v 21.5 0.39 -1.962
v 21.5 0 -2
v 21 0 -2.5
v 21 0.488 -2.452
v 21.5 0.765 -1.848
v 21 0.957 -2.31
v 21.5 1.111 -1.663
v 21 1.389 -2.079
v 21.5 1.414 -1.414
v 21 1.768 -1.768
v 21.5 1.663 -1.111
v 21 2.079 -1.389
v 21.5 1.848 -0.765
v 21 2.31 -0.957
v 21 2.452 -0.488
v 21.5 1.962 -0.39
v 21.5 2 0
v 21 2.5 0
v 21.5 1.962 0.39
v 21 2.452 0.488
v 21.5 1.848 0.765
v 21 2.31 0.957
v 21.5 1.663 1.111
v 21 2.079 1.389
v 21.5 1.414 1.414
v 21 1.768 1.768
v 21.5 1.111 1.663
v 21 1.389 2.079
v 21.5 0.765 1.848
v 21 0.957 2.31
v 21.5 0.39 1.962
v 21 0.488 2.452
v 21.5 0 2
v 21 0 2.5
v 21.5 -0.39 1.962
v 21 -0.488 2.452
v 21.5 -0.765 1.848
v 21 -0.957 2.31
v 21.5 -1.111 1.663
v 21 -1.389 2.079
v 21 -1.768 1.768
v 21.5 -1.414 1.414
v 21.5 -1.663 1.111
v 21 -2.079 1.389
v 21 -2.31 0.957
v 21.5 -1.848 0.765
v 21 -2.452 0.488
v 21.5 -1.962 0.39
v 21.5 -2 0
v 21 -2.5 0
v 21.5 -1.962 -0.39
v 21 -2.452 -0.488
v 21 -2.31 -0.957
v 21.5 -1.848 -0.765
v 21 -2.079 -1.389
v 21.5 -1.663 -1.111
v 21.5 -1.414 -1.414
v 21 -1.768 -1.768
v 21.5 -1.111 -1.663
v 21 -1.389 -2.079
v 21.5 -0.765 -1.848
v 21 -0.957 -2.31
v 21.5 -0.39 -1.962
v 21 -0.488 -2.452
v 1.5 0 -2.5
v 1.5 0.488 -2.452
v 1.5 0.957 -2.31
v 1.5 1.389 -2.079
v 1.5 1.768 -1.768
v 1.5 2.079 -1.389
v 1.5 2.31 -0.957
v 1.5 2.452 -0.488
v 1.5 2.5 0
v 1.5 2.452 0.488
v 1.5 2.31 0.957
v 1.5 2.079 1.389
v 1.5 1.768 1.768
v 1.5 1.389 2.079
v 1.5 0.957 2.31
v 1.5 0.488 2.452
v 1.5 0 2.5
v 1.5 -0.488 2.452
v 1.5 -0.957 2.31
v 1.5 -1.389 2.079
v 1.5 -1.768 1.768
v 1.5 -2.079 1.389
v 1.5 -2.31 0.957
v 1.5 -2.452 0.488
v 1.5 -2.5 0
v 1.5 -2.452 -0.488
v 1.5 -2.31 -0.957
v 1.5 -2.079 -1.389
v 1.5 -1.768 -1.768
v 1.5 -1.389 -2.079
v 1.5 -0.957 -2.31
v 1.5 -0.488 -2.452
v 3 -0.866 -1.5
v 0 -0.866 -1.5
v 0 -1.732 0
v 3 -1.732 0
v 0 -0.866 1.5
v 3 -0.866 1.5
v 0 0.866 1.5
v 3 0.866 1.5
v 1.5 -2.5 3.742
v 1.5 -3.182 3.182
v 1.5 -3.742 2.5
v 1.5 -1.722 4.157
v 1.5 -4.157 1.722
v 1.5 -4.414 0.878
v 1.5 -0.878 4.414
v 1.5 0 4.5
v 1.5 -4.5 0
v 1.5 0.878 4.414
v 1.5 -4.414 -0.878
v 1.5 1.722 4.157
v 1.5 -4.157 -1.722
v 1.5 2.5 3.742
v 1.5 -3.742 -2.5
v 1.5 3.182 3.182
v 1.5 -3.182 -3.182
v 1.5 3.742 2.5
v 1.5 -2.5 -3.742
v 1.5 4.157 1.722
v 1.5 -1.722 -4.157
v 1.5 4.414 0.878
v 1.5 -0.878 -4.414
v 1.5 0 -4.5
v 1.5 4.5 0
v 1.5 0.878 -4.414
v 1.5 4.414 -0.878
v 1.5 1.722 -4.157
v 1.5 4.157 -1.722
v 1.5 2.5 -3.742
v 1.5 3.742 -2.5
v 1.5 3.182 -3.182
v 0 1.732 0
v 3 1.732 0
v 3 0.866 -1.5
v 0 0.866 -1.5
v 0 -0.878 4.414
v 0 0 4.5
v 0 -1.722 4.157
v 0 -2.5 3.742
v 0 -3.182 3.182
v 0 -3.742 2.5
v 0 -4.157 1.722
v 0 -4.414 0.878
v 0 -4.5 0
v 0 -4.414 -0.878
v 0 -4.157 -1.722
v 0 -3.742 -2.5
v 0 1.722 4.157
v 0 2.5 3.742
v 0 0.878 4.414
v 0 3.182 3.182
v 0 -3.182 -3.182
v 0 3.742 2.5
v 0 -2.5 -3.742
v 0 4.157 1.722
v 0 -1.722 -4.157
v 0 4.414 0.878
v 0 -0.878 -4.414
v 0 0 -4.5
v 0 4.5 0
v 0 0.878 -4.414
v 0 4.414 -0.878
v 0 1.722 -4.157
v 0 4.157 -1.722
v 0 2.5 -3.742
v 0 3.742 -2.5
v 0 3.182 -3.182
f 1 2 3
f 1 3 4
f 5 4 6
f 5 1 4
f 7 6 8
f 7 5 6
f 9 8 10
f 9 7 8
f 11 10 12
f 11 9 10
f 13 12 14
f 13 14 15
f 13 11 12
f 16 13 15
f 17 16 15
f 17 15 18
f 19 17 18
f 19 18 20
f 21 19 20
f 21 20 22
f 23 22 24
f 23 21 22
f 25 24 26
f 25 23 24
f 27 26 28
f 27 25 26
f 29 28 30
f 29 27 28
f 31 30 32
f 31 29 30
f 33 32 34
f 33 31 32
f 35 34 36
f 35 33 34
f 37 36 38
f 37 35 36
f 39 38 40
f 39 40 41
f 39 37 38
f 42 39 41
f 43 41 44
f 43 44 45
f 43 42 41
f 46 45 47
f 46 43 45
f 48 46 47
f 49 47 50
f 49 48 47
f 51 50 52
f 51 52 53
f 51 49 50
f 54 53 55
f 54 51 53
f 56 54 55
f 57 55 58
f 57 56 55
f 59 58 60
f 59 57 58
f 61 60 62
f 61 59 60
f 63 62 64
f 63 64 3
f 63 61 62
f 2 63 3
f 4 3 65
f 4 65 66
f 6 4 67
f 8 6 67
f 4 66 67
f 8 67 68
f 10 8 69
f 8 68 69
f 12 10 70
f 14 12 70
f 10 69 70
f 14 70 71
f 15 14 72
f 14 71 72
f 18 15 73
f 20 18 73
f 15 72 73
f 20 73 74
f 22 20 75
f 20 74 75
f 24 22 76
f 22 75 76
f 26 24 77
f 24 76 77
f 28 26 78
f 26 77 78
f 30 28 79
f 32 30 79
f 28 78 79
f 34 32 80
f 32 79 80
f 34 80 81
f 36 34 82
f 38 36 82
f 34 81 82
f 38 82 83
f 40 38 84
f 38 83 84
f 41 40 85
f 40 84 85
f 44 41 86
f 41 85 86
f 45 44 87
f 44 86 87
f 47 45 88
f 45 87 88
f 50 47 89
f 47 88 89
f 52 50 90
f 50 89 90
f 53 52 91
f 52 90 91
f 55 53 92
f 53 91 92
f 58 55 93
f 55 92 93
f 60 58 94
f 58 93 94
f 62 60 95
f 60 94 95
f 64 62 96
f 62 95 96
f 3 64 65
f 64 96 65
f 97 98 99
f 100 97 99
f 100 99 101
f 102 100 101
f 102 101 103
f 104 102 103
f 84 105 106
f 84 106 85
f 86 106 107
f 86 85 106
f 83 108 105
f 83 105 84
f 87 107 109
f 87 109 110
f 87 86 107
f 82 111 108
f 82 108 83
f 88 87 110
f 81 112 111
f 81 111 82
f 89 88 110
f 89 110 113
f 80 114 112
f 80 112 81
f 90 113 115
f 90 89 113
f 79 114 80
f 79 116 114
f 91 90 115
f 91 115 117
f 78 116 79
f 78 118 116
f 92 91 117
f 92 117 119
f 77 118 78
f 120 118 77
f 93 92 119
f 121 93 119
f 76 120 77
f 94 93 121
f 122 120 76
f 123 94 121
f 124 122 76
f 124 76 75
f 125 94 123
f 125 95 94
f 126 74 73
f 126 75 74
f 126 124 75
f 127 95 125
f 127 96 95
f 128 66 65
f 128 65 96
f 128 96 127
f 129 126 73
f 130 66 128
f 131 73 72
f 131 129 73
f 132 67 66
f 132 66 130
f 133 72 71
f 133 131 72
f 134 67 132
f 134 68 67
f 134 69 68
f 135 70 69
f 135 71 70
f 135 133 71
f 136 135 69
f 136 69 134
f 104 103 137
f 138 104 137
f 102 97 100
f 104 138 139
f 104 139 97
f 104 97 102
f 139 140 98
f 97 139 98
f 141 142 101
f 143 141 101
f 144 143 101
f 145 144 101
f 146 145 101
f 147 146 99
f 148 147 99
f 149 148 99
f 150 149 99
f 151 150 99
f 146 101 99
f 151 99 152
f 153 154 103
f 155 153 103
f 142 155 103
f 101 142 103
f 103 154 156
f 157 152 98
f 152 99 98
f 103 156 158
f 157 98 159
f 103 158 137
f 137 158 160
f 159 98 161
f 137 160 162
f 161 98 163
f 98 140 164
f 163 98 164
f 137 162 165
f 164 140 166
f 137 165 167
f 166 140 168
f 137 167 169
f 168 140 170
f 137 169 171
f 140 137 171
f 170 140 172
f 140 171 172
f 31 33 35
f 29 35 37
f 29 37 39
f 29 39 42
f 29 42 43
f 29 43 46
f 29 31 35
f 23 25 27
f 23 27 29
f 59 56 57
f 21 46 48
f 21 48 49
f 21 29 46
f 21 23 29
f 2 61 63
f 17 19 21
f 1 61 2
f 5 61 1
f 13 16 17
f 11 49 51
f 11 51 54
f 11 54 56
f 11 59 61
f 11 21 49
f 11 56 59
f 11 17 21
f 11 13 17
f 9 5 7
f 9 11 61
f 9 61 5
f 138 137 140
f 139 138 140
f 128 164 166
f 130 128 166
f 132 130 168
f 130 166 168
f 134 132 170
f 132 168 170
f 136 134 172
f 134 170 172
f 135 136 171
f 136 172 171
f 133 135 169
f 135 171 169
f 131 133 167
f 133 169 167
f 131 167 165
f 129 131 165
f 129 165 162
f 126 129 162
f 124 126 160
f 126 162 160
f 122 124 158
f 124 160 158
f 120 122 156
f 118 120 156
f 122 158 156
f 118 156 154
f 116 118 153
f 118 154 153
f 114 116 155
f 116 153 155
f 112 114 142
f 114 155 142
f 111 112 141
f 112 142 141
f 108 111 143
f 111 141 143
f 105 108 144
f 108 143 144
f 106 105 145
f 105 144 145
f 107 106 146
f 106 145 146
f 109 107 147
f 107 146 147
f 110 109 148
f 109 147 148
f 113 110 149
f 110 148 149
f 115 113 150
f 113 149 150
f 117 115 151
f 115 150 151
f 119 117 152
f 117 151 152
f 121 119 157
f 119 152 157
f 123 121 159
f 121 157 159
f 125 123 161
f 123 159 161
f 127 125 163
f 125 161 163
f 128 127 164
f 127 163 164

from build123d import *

# Parameters (mm, degrees)
SKETCH1_R     = 4.5
HEAD_DEPTH    = 1.5
SKETCH2_R     = 2.5
BODY_DEPTH    = 20
DRIVE_DEPTH   = 3
CHAMFER1_SIZE = 0.5


with BuildPart() as part:
    # Sketch1 → Head (new body)
    with BuildSketch(Plane(origin=(0, 0, 0), x_dir=(0, 0, -1), z_dir=(1, 0, 0))):
        Circle(SKETCH1_R)
    extrude(amount=HEAD_DEPTH)

    # Sketch2 → Body (add)
    with BuildSketch(Plane(origin=(1.5, 0, 0), x_dir=(0, 0, -1), z_dir=(1, 0, 0))):
        Circle(SKETCH2_R)
    extrude(amount=BODY_DEPTH)

    # Sketch3 → Drive (cut)
    with BuildSketch(Plane.ZY):
        Polygon((0, 1.732050808), (-1.5, 0.866025404), (-1.5, -0.866025404), (0, -1.732050808), (1.5, -0.866025404), (1.5, 0.866025404), align=None)
    extrude(amount=-DRIVE_DEPTH, mode=Mode.SUBTRACT)

    # Chamfer1
    chamfer1_edges = [part.edges().sort_by_distance(p)[0] for p in [
        (21.5, 0, 2.5),
    ]]
    chamfer(chamfer1_edges, length=CHAMFER1_SIZE)


solid = part.part
